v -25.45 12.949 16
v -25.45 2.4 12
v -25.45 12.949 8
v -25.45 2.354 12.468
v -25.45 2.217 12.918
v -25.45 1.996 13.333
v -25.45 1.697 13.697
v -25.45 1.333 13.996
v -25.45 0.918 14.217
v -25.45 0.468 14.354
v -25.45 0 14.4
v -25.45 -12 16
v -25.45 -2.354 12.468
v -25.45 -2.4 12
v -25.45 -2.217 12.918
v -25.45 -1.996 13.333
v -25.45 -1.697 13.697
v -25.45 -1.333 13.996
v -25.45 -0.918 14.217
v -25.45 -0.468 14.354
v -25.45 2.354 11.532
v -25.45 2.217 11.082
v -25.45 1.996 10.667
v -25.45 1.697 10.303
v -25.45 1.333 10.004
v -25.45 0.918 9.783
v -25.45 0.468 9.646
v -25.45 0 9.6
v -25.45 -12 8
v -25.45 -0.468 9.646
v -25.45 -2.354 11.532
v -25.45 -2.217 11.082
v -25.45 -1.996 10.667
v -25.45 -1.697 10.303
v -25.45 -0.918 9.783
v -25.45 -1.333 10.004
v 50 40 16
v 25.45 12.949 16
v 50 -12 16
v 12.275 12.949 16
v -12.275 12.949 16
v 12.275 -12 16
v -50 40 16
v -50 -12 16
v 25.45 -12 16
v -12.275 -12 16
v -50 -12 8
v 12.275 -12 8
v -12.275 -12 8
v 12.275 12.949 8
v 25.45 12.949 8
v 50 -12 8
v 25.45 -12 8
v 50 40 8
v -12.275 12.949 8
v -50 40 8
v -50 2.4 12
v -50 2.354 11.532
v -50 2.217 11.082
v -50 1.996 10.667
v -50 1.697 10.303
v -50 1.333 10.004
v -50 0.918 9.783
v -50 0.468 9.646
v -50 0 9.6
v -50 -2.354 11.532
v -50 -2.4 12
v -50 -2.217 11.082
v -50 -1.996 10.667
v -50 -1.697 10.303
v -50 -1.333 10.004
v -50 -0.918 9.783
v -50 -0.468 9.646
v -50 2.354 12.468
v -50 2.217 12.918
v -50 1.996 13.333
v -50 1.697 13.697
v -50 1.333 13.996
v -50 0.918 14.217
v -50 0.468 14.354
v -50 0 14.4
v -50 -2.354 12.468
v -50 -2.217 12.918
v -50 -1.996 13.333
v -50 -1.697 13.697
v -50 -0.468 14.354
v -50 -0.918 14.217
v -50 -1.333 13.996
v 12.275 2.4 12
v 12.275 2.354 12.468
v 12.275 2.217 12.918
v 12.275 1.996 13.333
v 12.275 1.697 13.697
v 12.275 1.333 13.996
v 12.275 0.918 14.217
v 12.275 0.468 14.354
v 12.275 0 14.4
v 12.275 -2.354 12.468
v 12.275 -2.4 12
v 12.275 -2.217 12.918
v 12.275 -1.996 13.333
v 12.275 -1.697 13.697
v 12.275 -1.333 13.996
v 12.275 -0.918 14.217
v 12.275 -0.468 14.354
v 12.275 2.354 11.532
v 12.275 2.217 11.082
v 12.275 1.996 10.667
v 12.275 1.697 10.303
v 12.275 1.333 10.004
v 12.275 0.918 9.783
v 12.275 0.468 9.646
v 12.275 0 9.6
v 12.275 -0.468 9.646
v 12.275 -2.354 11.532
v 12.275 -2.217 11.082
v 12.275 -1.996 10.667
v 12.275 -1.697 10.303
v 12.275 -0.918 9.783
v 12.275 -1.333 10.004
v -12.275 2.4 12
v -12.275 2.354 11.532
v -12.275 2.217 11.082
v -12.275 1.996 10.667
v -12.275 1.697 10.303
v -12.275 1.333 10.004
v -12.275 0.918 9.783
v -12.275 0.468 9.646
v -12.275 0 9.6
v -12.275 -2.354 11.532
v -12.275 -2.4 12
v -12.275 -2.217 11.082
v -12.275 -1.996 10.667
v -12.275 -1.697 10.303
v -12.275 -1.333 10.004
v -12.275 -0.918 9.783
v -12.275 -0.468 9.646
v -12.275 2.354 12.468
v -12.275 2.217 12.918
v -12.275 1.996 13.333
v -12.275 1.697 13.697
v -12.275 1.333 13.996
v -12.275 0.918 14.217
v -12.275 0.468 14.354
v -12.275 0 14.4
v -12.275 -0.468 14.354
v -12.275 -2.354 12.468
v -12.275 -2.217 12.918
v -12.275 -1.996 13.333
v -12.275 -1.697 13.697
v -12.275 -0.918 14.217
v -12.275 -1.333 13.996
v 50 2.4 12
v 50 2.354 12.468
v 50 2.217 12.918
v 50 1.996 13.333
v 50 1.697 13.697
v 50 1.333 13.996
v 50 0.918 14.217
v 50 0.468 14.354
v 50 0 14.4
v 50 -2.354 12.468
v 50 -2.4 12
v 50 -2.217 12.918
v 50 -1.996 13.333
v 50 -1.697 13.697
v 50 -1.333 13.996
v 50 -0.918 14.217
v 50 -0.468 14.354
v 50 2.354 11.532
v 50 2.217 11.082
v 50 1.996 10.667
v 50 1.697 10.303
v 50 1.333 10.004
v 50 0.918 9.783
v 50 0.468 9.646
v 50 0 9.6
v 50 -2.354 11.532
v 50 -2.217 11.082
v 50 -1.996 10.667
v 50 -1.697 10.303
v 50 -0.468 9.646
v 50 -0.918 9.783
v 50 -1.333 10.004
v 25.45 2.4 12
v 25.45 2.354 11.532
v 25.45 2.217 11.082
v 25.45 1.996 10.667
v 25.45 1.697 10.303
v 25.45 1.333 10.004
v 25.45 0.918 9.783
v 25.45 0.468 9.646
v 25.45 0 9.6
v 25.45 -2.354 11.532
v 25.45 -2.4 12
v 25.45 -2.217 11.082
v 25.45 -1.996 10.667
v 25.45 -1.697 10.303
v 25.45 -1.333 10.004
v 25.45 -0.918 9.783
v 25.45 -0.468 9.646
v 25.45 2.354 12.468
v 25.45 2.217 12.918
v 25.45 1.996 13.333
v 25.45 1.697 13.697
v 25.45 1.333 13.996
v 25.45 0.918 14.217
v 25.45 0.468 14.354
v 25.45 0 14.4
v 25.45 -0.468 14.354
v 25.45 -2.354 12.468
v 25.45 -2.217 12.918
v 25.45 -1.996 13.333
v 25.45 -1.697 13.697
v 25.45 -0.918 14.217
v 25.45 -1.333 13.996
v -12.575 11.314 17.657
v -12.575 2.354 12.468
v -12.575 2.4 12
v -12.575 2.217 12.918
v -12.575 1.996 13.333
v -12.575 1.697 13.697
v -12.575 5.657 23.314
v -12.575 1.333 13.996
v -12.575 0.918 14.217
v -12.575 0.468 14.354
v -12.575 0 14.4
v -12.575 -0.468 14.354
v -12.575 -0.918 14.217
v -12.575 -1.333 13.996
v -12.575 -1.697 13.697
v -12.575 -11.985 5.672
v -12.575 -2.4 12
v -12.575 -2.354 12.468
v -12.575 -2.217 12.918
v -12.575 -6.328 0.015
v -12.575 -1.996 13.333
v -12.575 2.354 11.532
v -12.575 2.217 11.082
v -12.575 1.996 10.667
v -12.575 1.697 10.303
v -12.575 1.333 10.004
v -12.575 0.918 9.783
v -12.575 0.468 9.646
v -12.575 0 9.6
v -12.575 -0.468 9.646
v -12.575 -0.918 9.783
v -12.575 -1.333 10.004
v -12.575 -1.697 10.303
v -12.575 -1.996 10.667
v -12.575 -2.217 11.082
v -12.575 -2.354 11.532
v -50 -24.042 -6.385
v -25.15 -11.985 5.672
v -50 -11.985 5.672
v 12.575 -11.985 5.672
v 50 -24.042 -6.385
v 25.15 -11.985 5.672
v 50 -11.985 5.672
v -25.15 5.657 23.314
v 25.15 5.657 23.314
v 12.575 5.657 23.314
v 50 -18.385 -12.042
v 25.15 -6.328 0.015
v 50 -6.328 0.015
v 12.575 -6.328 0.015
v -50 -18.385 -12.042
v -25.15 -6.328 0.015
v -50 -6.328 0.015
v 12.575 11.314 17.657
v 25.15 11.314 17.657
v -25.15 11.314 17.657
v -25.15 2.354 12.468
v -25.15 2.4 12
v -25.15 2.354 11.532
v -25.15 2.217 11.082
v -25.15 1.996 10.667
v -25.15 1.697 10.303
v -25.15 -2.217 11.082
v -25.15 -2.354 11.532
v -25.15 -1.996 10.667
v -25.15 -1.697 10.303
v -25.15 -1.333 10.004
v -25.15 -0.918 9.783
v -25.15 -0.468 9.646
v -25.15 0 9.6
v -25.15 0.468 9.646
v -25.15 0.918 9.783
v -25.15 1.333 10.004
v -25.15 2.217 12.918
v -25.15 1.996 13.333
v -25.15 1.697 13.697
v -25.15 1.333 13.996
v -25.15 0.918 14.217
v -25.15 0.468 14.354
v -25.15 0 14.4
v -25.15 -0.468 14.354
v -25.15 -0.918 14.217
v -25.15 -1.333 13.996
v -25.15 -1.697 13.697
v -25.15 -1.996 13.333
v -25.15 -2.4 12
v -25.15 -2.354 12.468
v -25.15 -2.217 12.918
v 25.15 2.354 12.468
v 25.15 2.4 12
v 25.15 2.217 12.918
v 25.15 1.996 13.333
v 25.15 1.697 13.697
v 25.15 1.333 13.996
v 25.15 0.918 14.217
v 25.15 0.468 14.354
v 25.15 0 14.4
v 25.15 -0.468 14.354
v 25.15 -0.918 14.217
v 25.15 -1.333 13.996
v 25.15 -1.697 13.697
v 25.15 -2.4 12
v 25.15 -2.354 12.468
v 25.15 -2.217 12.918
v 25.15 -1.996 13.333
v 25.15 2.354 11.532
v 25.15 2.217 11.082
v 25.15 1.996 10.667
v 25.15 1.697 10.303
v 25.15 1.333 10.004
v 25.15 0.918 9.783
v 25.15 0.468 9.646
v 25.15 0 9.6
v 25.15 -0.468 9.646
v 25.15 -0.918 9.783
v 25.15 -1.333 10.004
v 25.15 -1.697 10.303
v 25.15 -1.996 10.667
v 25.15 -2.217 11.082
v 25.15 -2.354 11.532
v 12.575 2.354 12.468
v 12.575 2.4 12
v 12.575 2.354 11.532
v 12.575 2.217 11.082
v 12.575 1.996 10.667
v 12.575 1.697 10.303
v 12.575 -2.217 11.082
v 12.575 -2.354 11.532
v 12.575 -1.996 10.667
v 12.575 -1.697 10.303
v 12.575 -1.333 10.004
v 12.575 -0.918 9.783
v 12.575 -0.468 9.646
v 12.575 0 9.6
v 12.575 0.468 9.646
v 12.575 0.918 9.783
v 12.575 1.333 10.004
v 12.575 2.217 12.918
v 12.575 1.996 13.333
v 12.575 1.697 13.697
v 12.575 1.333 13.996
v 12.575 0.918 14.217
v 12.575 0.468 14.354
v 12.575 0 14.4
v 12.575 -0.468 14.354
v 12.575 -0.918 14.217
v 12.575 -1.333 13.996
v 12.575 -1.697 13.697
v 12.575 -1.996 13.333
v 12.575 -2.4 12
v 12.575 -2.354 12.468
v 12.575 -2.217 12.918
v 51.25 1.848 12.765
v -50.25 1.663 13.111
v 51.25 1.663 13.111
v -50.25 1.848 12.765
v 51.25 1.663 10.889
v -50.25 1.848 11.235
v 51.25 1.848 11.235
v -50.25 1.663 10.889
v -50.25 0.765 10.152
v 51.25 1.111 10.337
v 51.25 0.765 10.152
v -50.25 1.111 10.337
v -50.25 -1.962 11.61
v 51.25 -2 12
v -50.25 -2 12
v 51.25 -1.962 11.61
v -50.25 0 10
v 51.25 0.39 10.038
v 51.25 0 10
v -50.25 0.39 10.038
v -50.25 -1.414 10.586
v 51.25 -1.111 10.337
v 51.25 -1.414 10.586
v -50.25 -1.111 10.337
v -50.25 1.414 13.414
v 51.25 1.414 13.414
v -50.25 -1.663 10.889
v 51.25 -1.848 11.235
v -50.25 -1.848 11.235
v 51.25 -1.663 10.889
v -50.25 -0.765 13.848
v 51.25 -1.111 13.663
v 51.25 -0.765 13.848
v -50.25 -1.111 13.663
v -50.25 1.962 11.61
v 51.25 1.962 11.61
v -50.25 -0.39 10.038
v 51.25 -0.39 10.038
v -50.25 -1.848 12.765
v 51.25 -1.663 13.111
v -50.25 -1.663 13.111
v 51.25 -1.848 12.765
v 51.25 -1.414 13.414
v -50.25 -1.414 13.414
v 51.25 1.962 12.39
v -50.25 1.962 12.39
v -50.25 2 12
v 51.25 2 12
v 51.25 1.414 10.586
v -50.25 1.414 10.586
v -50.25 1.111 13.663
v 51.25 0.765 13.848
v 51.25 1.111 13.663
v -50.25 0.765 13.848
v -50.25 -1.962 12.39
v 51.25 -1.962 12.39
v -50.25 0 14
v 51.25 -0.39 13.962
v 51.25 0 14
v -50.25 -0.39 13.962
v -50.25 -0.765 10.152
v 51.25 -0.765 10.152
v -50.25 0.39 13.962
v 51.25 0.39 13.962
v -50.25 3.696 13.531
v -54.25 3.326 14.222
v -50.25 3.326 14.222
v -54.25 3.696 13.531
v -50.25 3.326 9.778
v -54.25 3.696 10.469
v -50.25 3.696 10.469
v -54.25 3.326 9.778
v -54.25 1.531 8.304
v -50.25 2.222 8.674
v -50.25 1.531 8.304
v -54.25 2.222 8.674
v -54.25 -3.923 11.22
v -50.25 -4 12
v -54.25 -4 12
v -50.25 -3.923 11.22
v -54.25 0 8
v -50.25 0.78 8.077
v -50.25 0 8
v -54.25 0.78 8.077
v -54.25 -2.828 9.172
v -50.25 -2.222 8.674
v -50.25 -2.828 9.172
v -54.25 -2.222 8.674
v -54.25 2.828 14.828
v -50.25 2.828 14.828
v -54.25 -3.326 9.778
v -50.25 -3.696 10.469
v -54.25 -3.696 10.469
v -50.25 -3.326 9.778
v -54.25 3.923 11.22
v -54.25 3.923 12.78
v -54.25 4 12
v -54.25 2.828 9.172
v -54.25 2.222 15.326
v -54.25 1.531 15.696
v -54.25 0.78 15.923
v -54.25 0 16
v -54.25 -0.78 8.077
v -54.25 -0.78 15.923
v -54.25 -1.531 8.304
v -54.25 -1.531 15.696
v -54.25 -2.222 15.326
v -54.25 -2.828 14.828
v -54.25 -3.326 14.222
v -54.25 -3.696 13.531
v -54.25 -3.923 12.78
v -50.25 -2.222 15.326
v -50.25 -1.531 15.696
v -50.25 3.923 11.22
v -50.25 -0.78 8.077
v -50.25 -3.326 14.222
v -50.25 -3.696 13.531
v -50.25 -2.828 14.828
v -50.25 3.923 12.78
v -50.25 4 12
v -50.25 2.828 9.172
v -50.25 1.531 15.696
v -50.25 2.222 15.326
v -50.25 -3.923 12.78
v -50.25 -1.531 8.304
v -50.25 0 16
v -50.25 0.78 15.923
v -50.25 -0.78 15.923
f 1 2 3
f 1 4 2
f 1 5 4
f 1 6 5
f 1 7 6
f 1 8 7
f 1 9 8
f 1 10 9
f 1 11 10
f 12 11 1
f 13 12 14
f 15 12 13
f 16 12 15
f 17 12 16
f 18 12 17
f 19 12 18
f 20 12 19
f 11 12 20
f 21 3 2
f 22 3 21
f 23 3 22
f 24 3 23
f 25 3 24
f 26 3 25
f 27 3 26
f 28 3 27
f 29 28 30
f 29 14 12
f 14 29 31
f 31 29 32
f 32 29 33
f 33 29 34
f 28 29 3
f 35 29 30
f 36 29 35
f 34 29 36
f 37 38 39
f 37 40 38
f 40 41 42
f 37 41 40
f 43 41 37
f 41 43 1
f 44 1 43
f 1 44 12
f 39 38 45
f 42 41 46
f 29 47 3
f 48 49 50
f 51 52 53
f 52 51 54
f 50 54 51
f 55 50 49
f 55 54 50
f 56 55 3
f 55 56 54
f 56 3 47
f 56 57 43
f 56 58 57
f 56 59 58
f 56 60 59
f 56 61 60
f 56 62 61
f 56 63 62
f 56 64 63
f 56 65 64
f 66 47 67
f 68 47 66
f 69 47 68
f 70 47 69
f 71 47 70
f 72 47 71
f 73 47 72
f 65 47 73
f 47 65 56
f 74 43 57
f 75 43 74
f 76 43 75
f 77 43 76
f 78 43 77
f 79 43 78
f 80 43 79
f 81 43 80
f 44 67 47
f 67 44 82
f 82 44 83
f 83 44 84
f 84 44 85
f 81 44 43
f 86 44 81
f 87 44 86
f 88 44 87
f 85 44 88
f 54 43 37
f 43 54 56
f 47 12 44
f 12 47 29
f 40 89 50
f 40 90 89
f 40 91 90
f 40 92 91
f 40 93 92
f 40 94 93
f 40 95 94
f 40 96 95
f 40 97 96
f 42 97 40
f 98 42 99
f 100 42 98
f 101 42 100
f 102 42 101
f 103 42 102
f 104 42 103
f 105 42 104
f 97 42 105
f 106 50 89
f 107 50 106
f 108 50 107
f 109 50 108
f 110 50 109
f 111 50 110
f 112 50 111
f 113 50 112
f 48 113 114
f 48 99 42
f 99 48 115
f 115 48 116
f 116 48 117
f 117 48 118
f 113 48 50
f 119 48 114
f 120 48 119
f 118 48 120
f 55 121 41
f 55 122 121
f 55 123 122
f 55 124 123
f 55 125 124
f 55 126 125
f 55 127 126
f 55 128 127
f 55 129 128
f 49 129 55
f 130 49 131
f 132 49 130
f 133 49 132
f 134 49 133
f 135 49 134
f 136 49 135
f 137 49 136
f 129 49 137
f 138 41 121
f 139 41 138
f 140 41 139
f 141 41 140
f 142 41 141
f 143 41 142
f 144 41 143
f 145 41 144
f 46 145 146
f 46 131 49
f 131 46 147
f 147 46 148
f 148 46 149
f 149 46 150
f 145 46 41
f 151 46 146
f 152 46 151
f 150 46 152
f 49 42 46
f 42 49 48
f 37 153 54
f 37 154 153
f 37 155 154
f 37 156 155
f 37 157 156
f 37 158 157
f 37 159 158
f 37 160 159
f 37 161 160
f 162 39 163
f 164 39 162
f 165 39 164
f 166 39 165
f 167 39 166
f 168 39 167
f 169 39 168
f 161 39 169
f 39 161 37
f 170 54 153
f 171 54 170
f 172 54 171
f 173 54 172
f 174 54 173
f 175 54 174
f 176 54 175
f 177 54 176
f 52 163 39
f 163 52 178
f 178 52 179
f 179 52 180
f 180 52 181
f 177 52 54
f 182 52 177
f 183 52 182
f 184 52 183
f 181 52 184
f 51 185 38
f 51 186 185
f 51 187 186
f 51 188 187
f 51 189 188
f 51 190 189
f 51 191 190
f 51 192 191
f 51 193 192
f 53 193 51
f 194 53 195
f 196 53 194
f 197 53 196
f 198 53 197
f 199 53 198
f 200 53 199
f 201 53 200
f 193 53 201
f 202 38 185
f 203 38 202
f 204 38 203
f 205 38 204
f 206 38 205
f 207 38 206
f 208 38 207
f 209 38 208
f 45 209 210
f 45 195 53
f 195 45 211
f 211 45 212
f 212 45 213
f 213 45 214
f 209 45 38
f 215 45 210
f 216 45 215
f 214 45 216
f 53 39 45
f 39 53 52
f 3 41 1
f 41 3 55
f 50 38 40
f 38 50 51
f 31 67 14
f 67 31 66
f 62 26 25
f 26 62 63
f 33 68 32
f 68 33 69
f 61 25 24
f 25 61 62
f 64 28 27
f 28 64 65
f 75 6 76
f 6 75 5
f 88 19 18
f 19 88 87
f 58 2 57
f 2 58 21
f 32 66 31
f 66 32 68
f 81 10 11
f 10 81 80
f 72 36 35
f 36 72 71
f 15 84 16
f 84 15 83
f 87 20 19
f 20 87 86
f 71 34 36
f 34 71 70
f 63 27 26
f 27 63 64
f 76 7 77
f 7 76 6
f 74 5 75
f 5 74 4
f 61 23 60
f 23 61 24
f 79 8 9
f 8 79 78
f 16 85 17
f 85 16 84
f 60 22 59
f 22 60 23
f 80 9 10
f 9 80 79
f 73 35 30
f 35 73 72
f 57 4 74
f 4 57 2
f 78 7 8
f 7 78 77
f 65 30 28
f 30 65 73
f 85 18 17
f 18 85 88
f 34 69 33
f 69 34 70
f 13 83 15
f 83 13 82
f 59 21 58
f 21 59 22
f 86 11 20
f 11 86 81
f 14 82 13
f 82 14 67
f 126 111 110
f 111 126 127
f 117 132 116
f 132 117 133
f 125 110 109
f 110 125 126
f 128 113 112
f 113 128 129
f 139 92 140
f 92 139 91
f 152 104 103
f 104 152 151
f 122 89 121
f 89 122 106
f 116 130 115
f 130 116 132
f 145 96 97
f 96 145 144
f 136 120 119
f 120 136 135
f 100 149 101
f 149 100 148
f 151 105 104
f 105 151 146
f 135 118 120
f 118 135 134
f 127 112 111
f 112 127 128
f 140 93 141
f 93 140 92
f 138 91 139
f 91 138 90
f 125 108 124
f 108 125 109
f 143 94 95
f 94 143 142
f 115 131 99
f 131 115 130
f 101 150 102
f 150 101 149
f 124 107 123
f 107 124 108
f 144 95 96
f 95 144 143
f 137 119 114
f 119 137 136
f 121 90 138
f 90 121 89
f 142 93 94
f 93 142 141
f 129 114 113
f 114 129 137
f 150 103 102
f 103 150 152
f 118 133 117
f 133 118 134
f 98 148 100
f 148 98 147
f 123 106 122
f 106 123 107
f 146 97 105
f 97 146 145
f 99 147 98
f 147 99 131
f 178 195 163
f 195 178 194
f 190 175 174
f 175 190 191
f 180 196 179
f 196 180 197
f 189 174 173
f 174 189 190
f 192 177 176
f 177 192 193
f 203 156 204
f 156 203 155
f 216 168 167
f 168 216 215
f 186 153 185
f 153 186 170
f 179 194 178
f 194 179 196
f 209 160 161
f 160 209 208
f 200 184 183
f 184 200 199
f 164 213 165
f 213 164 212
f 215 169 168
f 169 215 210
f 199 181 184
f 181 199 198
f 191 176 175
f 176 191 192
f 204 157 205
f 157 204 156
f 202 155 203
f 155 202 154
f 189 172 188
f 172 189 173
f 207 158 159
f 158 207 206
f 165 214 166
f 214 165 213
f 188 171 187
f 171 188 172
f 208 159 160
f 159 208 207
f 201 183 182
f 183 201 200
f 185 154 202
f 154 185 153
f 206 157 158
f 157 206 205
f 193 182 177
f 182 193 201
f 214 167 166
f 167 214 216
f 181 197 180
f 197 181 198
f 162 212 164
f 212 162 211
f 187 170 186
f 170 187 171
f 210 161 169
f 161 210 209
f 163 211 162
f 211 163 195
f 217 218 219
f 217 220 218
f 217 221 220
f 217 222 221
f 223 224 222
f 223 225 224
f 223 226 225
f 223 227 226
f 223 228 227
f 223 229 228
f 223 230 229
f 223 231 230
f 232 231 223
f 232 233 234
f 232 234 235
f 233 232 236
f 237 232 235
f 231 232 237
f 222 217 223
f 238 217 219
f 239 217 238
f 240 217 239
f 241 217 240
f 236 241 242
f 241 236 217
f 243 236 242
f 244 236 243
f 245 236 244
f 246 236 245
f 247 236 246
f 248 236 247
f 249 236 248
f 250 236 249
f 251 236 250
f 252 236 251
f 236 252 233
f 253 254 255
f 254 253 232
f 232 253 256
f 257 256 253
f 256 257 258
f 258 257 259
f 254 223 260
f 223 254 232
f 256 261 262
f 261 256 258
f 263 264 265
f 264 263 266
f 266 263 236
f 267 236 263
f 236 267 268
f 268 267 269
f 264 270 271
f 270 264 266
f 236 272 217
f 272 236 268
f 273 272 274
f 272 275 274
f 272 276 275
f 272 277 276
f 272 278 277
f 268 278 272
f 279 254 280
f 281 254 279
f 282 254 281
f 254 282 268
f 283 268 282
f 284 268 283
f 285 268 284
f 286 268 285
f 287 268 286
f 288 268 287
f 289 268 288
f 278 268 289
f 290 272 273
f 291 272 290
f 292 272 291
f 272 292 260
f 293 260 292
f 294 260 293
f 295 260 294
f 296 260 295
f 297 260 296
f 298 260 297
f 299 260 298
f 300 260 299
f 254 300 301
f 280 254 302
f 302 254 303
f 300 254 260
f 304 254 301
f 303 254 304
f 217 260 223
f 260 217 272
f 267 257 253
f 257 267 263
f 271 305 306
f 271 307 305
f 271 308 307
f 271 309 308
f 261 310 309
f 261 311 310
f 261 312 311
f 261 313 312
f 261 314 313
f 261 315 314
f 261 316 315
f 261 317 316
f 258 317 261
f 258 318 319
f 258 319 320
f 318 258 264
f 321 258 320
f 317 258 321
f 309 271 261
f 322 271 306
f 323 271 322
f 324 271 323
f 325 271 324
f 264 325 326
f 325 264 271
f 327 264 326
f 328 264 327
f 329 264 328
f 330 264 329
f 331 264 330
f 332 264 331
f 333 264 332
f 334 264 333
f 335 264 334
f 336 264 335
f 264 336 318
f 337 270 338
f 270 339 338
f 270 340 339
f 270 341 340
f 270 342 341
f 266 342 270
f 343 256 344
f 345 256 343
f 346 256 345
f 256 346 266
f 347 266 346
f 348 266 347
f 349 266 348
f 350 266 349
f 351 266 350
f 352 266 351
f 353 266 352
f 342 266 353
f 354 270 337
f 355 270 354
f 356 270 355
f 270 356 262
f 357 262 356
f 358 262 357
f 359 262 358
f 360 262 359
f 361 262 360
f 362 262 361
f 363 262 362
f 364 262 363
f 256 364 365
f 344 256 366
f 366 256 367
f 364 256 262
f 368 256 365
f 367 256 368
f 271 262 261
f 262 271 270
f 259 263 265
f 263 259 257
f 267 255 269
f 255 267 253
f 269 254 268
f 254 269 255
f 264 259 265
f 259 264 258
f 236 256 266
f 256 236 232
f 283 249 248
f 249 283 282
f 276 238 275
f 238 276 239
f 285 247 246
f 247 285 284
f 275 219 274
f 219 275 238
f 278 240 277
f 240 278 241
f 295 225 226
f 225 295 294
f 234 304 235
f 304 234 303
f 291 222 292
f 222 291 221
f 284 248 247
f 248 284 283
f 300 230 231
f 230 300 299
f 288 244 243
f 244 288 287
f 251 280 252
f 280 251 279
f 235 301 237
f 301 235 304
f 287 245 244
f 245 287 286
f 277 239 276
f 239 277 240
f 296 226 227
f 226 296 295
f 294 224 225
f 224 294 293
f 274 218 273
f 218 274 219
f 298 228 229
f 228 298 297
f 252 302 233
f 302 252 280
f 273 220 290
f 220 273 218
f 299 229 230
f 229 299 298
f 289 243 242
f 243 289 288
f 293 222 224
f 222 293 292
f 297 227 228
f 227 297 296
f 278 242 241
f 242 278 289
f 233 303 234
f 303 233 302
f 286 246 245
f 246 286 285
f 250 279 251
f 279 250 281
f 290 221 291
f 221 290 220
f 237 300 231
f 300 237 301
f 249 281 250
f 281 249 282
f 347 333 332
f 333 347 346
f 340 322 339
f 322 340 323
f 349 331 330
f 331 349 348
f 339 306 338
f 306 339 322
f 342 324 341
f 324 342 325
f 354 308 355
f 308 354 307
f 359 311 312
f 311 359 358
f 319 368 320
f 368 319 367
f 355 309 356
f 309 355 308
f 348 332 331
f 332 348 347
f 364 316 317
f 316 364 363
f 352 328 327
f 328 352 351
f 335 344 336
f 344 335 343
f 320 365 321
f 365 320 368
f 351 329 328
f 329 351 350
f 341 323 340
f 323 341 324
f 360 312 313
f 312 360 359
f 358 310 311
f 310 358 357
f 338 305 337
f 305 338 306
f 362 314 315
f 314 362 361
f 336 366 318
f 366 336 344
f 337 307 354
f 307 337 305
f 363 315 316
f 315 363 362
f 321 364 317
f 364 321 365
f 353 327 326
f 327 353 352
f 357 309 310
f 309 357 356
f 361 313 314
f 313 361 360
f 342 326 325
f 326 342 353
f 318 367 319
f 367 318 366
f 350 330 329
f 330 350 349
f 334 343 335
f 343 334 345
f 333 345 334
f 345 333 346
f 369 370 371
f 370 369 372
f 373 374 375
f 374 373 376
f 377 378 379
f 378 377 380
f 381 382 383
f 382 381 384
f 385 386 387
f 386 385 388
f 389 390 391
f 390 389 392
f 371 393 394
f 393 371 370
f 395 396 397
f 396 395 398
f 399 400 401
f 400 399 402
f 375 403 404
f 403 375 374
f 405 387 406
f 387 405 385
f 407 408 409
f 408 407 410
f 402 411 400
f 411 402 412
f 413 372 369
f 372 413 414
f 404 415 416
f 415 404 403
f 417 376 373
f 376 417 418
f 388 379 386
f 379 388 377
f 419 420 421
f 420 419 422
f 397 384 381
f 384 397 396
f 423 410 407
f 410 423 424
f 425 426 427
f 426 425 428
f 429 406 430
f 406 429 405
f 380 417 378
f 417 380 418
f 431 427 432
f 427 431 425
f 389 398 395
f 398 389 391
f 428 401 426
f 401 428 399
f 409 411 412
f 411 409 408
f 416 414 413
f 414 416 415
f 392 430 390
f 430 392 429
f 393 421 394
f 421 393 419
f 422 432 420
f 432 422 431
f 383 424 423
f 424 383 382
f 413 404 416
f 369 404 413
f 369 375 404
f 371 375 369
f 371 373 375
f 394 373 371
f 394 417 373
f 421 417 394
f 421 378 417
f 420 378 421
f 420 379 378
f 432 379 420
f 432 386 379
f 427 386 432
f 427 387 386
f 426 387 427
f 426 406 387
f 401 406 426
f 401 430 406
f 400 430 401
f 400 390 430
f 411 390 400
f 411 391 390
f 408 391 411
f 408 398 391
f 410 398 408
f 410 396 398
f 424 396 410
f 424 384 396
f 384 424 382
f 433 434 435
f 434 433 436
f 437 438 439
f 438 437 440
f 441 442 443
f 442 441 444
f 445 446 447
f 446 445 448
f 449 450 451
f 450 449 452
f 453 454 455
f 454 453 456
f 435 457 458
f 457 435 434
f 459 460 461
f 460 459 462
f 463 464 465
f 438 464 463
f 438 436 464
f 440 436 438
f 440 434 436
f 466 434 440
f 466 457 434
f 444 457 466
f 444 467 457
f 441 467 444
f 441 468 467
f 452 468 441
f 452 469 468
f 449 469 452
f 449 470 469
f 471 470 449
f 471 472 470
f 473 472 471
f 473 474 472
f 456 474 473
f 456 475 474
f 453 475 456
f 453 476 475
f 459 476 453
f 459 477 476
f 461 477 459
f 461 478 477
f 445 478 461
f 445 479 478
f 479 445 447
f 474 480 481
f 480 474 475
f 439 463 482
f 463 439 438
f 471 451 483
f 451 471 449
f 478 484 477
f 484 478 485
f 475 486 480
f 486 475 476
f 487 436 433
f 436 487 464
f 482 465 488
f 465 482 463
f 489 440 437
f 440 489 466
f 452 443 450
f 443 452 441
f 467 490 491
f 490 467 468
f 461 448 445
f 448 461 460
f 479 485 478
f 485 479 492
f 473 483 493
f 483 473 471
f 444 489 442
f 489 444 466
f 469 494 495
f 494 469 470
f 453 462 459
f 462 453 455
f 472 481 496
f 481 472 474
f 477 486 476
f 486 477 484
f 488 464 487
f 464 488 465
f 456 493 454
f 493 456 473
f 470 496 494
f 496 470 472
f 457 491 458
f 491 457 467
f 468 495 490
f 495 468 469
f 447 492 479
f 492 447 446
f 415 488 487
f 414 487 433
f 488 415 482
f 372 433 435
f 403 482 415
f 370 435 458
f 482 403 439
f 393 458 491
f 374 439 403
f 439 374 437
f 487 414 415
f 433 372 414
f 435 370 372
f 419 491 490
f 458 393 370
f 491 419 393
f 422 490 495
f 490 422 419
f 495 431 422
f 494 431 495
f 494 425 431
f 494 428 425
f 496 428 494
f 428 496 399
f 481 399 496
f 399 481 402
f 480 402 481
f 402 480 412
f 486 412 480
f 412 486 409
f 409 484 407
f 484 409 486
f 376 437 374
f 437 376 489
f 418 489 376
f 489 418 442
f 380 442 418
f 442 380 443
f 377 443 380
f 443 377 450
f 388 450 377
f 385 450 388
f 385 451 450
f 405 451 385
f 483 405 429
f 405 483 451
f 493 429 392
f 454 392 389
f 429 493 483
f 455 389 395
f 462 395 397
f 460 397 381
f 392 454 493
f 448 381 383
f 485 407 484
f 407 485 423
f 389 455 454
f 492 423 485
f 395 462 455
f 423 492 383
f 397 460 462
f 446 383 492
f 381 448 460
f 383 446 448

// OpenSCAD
$fn = 32;

// ------------------------------------------------------------------------
// Butt hinge: hinge 100 mm, leaf swung 45 deg
// Every part is its own module, assembly() places every instance.
// ------------------------------------------------------------------------

// --- part 1 ---
module hinge_base() {
  difference() {
    union() {
      translate([-50, -12, -4]) cube([24.55, 52, 8]);
      translate([-12.275, -12, -4]) cube([24.55, 52, 8]);
      translate([25.45, -12, -4]) cube([24.55, 52, 8]);
      translate([-50, 12.949, -4]) cube([100, 27.051, 8]);
    }
    translate([-37.725, 0, 0]) rotate([0, 90, 0]) cylinder(h = 26.55, d = 4.8, center = true);
    translate([0, 0, 0]) rotate([0, 90, 0]) cylinder(h = 26.55, d = 4.8, center = true);
    translate([37.725, 0, 0]) rotate([0, 90, 0]) cylinder(h = 26.55, d = 4.8, center = true);
  }
}

// --- part 2 ---
module hinge_mover() {
  difference() {
    union() {
      translate([-25.15, -30, -4]) cube([12.575, 42, 8]);
      translate([12.575, -30, -4]) cube([12.575, 42, 8]);
      translate([-50, -30, -4]) cube([100, 17.051, 8]);
    }
    translate([-18.863, 0, 0]) rotate([0, 90, 0]) cylinder(h = 14.575, d = 4.8, center = true);
    translate([18.863, 0, 0]) rotate([0, 90, 0]) cylinder(h = 14.575, d = 4.8, center = true);
  }
}

// --- part 3 ---
module hinge_pin() {
  rotate([0, 90, 0]) cylinder(h = 102.5, d = 4, center = true);
  translate([-54.25, 0, 0]) rotate([0, 90, 0]) cylinder(h = 4, d = 8);
}

// --- assembly ---
module assembly() {
  color([0.80, 0.24, 0.20]) translate([0, 0, 12]) rotate([0, 0, 0]) hinge_base();
  color([0.20, 0.45, 0.75]) translate([0, 0, 12]) rotate([45, 0, 0]) hinge_mover();
  color([0.25, 0.62, 0.32]) translate([0, 0, 12]) rotate([0, 0, 0]) hinge_pin();
}

assembly();
